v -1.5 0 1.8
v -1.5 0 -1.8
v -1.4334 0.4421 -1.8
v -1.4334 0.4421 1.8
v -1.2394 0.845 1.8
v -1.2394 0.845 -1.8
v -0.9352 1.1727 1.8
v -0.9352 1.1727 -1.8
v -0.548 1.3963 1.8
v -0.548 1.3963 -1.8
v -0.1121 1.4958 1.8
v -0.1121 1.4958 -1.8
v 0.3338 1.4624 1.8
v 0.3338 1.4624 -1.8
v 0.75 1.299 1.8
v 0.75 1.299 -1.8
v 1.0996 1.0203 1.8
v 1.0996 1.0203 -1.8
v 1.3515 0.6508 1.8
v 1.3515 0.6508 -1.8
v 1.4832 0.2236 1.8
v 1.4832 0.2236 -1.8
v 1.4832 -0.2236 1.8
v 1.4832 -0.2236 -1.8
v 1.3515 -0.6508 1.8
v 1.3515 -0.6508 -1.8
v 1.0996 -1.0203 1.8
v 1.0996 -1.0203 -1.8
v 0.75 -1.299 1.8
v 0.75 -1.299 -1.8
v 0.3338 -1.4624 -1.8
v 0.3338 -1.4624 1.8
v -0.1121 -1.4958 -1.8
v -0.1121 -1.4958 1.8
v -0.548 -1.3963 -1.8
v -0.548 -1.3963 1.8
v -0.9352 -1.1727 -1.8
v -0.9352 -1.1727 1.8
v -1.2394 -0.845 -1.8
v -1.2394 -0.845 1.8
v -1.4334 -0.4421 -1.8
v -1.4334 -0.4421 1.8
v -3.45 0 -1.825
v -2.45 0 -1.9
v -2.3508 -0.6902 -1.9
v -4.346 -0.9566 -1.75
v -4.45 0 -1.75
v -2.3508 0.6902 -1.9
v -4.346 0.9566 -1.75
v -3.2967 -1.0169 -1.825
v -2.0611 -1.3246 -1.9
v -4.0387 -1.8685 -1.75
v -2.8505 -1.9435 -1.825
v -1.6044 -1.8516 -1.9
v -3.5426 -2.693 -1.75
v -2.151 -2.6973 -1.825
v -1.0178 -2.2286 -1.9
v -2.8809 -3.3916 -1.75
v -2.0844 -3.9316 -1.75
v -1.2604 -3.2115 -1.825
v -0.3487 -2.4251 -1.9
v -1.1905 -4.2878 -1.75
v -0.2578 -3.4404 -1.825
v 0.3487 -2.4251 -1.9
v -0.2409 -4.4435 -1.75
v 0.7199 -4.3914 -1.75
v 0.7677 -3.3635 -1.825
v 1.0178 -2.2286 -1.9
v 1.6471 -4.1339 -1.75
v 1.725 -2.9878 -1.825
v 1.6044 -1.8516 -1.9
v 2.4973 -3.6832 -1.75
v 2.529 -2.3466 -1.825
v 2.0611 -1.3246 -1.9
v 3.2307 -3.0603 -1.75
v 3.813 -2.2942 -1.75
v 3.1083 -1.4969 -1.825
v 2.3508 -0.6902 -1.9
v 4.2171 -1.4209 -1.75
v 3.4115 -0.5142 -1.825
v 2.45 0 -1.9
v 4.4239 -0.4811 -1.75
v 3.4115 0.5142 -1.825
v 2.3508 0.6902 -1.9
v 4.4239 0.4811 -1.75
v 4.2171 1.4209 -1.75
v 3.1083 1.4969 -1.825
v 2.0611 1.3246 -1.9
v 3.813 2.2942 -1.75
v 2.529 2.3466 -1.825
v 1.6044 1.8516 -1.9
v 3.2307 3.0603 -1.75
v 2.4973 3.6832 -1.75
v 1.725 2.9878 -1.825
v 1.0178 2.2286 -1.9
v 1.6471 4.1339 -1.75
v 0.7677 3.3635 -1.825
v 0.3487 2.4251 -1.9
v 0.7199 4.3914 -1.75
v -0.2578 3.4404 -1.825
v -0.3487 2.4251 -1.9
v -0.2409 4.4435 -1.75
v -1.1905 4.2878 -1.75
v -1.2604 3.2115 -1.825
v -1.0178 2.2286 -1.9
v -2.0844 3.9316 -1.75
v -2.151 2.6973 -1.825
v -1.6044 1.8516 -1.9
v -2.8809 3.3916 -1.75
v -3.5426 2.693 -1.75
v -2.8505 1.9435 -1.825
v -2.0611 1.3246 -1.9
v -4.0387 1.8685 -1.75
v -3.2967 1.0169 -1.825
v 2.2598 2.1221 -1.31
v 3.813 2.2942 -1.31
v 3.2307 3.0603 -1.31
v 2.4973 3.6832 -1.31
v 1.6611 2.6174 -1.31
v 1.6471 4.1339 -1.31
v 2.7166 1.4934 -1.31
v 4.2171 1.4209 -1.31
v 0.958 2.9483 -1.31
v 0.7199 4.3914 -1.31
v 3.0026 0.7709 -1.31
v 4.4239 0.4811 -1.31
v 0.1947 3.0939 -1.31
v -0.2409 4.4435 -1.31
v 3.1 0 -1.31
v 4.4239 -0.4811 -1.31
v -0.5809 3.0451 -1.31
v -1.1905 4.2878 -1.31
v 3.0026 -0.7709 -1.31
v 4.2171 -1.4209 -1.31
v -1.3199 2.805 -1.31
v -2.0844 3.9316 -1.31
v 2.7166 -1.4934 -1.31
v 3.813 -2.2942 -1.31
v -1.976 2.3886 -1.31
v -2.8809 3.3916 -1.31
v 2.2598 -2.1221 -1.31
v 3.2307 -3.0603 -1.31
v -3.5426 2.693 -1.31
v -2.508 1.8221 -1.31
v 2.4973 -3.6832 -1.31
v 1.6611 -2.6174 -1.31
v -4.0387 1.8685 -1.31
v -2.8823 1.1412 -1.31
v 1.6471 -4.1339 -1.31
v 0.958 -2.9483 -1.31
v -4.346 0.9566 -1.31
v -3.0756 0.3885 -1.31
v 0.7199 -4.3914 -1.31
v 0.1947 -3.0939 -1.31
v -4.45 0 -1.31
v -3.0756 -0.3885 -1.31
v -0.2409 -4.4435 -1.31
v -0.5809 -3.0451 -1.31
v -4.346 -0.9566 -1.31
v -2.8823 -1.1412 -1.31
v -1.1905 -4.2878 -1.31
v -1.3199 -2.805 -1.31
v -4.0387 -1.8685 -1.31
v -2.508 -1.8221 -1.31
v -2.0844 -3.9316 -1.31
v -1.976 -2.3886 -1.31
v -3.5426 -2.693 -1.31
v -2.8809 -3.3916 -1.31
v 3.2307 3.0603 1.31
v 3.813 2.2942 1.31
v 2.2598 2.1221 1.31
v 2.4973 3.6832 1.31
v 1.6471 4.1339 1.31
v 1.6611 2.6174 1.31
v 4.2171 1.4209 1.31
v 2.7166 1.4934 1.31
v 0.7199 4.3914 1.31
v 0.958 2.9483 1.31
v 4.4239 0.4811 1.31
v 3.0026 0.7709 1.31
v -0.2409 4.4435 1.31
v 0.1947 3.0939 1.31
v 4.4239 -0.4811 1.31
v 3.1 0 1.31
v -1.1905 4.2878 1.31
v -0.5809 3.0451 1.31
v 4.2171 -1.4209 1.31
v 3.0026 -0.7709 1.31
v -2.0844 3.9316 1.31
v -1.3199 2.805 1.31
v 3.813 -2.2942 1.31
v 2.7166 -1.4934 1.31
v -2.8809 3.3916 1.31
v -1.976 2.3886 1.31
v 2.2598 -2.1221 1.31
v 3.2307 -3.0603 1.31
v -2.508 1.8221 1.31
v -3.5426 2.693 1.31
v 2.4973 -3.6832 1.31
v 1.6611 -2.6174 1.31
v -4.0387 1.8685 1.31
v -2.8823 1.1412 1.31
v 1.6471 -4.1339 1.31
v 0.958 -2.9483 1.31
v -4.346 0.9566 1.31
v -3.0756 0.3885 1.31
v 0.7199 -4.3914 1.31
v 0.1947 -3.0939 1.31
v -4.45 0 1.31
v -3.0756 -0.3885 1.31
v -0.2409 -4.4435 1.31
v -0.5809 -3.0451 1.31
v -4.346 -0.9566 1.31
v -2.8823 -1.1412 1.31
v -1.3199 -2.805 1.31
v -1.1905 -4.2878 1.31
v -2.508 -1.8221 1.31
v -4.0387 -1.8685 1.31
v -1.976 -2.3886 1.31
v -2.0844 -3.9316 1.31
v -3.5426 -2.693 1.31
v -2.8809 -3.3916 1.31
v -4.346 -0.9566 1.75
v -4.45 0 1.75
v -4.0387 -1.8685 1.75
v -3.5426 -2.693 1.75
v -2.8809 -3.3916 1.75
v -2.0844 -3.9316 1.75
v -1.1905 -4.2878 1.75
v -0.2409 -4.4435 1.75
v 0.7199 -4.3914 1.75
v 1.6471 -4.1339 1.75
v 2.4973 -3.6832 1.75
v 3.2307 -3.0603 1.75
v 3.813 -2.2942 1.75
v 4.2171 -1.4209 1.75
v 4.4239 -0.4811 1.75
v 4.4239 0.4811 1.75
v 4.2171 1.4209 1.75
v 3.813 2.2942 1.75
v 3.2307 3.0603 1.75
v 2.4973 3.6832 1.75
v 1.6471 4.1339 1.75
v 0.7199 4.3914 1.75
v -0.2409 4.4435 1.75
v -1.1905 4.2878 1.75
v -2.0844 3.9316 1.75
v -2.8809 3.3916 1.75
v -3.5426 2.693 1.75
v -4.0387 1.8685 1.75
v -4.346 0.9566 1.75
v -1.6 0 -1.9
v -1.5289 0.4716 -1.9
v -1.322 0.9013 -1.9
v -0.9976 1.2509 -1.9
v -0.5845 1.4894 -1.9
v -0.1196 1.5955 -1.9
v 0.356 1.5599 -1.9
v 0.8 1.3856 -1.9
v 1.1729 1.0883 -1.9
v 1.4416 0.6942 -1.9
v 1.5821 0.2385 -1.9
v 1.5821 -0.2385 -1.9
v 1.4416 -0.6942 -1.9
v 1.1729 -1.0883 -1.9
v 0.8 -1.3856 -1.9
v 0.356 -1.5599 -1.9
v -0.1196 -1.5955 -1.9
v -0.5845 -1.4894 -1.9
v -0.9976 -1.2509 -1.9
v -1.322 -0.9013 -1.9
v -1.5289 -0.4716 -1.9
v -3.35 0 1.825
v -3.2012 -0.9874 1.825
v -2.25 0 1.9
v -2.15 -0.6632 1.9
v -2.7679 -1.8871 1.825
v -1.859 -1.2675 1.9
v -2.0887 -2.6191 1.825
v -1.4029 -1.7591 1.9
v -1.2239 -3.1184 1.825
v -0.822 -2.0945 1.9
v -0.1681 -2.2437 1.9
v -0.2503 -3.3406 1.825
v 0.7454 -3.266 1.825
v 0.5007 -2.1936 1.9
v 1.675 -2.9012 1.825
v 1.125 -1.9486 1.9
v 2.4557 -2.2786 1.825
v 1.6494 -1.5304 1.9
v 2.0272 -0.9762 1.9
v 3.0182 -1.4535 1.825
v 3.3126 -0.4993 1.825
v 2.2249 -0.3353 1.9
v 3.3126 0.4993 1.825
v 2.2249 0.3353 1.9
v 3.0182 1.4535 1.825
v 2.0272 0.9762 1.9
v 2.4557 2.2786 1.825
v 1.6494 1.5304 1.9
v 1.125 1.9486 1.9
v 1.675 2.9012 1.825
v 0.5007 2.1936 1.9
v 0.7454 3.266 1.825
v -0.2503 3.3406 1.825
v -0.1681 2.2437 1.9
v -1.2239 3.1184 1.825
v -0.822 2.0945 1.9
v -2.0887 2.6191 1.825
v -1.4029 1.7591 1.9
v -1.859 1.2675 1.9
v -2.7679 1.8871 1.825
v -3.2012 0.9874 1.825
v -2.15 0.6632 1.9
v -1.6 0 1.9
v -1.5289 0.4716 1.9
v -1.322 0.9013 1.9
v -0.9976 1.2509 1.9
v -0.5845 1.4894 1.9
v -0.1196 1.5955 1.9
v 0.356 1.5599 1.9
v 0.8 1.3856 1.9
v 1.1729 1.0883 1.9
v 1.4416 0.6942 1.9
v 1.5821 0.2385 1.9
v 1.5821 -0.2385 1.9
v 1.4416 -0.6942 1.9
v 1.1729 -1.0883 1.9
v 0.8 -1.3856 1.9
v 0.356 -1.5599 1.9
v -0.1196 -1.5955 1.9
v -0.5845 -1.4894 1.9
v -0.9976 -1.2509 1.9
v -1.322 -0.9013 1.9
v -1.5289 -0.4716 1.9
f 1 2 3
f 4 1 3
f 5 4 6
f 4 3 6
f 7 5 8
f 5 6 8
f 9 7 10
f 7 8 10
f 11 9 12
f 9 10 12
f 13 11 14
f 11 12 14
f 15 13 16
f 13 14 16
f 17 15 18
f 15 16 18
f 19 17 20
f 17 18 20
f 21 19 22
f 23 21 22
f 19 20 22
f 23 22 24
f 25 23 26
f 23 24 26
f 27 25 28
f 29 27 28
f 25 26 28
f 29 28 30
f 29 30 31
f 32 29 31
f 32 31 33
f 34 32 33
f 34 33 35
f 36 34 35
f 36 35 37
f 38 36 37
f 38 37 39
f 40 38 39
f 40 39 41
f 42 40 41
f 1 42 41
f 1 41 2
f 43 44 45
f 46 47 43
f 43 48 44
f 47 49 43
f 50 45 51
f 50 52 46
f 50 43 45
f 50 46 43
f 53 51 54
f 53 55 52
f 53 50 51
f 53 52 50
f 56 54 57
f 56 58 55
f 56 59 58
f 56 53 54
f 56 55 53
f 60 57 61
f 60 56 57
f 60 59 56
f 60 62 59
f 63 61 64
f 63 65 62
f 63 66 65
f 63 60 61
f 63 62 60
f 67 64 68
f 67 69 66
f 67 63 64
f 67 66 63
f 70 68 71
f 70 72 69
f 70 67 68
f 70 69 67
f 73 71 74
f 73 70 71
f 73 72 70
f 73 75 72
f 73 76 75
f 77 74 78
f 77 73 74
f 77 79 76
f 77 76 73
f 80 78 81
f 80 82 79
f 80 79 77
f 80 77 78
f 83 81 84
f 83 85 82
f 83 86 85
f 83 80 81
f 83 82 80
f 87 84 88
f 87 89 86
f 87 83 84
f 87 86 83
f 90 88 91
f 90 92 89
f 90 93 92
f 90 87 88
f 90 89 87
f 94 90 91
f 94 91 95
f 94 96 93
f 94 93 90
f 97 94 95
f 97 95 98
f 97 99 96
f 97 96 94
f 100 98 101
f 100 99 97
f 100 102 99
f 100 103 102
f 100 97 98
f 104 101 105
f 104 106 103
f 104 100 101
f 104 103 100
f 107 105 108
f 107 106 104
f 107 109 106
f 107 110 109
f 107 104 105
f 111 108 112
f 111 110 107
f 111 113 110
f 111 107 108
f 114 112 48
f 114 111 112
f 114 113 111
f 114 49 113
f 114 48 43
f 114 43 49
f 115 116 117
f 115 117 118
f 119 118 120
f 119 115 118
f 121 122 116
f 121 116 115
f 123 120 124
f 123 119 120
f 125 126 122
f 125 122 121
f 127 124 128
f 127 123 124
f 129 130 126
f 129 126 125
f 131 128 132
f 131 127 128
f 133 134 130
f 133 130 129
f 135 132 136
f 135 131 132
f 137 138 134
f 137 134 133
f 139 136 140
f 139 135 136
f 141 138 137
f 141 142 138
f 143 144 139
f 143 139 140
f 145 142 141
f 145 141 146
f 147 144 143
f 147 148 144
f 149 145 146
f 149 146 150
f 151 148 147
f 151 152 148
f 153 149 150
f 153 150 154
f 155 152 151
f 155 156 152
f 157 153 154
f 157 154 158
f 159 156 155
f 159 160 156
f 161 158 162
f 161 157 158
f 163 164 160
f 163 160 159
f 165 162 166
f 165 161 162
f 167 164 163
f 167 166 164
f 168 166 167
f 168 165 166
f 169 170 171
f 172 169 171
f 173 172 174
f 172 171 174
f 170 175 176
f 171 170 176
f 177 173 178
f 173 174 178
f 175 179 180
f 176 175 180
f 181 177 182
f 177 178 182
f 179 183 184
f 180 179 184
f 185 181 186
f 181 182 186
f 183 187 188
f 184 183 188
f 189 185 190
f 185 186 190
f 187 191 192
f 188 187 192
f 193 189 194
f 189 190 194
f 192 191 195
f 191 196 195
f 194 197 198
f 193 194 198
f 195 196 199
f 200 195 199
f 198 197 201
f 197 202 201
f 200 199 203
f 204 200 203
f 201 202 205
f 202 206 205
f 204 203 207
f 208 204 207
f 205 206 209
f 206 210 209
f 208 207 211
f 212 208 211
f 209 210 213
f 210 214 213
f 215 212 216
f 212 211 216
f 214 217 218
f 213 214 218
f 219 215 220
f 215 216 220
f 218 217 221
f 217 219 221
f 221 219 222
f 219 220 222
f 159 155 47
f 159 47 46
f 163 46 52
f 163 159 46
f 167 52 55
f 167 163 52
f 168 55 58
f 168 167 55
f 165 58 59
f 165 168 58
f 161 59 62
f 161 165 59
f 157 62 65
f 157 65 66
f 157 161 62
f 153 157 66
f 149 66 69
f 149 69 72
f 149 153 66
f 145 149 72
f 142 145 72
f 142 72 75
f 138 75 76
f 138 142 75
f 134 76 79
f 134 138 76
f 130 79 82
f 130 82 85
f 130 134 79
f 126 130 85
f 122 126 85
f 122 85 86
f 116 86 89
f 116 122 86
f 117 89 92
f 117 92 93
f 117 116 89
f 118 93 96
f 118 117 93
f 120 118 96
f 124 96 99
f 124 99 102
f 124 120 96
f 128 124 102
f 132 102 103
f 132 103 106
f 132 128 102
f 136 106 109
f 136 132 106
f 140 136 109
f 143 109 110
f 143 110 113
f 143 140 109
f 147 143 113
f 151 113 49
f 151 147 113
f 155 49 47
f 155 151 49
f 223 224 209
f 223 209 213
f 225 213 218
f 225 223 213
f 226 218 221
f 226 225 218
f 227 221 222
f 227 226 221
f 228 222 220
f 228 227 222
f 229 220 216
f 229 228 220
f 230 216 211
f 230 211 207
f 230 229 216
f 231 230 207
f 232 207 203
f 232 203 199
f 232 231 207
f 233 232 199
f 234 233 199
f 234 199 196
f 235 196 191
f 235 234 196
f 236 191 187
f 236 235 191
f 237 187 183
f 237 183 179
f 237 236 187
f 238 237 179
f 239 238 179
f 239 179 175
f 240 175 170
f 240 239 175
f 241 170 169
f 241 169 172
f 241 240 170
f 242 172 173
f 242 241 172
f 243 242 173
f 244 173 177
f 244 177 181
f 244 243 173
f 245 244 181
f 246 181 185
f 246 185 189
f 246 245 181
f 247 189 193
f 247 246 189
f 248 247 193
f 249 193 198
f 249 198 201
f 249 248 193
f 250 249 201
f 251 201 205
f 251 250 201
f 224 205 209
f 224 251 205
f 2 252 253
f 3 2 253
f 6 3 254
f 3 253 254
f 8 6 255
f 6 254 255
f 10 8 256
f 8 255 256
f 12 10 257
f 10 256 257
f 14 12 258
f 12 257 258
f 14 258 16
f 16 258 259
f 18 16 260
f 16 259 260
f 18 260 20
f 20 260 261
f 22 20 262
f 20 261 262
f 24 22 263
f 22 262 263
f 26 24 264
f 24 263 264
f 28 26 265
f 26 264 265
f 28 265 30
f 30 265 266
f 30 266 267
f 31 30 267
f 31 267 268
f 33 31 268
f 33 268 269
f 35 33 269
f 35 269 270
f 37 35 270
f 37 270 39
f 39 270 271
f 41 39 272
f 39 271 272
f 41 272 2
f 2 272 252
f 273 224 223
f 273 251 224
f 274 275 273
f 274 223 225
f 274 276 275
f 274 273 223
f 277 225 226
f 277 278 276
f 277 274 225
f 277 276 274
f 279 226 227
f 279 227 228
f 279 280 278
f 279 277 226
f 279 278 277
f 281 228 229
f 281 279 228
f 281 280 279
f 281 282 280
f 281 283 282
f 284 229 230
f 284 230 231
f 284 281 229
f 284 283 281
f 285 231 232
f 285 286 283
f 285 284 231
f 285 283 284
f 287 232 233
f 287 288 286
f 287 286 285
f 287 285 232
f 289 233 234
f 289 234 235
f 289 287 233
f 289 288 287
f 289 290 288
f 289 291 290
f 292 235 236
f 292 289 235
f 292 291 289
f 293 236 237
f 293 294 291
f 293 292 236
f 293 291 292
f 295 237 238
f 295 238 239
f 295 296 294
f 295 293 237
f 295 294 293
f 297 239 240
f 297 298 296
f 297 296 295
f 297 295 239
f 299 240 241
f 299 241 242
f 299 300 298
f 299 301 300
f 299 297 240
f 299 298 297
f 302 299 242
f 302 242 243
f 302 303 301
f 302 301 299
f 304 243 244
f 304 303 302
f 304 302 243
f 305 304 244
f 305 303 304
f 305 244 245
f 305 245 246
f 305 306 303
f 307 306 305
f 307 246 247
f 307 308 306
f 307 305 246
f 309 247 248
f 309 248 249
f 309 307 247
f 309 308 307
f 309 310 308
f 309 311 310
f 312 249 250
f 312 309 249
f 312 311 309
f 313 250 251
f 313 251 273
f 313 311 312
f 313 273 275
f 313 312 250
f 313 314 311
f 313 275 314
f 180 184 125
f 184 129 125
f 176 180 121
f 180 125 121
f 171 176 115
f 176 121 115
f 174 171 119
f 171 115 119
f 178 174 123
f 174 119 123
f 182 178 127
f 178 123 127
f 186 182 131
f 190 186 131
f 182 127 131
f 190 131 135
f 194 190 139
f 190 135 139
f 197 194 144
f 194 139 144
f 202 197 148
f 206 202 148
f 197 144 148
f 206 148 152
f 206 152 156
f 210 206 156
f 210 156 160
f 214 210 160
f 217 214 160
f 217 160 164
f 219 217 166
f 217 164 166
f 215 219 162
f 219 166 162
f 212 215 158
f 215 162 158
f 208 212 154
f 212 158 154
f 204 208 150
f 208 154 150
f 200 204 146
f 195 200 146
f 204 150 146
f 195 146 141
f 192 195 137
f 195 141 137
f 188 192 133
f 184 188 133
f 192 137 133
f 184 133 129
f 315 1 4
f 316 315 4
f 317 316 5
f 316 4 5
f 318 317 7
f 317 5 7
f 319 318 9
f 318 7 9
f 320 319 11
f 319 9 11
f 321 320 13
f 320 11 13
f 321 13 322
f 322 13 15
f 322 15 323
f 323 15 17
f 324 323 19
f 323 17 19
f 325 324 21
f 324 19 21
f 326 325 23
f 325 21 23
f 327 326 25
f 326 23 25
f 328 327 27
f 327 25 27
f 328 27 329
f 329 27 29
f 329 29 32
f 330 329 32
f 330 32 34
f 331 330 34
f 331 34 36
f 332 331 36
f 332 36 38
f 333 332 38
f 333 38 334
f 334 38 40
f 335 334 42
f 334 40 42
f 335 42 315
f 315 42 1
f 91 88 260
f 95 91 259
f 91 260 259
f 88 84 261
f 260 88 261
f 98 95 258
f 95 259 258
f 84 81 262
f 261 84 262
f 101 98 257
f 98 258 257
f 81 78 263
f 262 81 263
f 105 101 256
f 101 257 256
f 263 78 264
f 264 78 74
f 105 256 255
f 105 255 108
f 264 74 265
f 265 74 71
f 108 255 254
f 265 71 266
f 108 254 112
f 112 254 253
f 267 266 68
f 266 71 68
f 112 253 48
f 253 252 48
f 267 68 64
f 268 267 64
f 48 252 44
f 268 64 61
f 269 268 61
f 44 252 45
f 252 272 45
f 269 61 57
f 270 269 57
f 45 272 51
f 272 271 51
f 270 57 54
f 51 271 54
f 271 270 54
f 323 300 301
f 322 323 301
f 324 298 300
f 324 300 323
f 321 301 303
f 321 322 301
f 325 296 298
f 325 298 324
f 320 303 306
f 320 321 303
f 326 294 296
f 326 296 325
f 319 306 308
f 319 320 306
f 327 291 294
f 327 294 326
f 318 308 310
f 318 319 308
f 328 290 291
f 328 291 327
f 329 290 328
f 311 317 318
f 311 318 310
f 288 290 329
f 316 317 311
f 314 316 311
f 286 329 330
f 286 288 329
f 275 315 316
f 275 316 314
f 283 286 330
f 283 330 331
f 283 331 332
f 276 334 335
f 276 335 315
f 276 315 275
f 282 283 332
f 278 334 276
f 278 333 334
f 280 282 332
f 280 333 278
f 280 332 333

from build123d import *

# Parameters (mm, degrees)
SKETCH_1_R          = 4.45
EXTRUDE_1_DEPTH     = 1.9
SKETCH_2_R          = 4.45
SKETCH_2_R_2        = 3.1
CUT_EXTRUDE_2_DEPTH = 1.31
SKETCH_3_R          = 1
CUT_EXTRUDE_3_DEPTH = 3.8
CHAMFER_1_SIZE      = 0.25
CHAMFER_2_SIZE      = 2
CHAMFER_2_SIZE2     = 0.15
CHAMFER_3_SIZE      = 0.15
CHAMFER_3_SIZE2     = 2.2
SKETCH_4_R          = 1.5
CUT_EXTRUDE_1_DEPTH = 10
CHAMFER_4_SIZE      = 0.1


with BuildPart() as part:
    # 草图1 → 拉伸1 (new, symmetric)
    with BuildSketch(Plane.XY):
        with Locations(Location((0, 0, 0), (0, 0, 180))):
            Circle(SKETCH_1_R)
    extrude(amount=EXTRUDE_1_DEPTH, both=True)

    # 草图2 → 拉伸2 (cut, symmetric)
    with BuildSketch(Plane.XY):
        with Locations(Location((0, 0, 0), (0, 0, 180))):
            Circle(SKETCH_2_R)
        Circle(SKETCH_2_R_2, mode=Mode.SUBTRACT)
    extrude(amount=CUT_EXTRUDE_2_DEPTH, both=True, mode=Mode.SUBTRACT)

    # 草图3 → 拉伸3 (cut)
    with BuildSketch(Plane.XY.offset(1.9)):
        Circle(SKETCH_3_R)
    extrude(amount=-CUT_EXTRUDE_3_DEPTH, mode=Mode.SUBTRACT)

    # 倒角1
    chamfer_1_edges = [part.edges().sort_by_distance(p)[0] for p in [
        (-1, 0, 1.9),
        (-1, 0, -1.9),
    ]]
    chamfer(chamfer_1_edges, length=CHAMFER_1_SIZE)

    # 倒角2
    chamfer_2_edges = [part.edges().sort_by_distance(p)[0] for p in [
        (4.45, 0, -1.9),
    ]]
    chamfer_2_side = [part.faces().sort_by_distance(p)[0] for p in [
        (-1.375865007, 0, -1.9),
    ]]
    chamfer(chamfer_2_edges, length=CHAMFER_2_SIZE, length2=CHAMFER_2_SIZE2, reference=chamfer_2_side[0])

    # 倒角3
    chamfer_3_edges = [part.edges().sort_by_distance(p)[0] for p in [
        (4.45, 0, 1.9),
    ]]
    chamfer_3_side = [part.faces().sort_by_distance(p)[0] for p in [
        (4.45, 0, 1.605),
    ]]
    chamfer(chamfer_3_edges, length=CHAMFER_3_SIZE, length2=CHAMFER_3_SIZE2, reference=chamfer_3_side[0])

    # 草图4 → 切除-拉伸1 (cut)
    with BuildSketch(Plane(origin=(0, 0, -1.9), x_dir=(-1, 0, 0), z_dir=(0, 0, -1))):
        Circle(SKETCH_4_R)
    extrude(amount=-CUT_EXTRUDE_1_DEPTH, mode=Mode.SUBTRACT)

    # 倒角4
    chamfer_4_edges = [part.edges().sort_by_distance(p)[0] for p in [
        (1.5, 0, 1.9),
        (1.5, 0, -1.9),
    ]]
    chamfer(chamfer_4_edges, length=CHAMFER_4_SIZE)


solid = part.part
